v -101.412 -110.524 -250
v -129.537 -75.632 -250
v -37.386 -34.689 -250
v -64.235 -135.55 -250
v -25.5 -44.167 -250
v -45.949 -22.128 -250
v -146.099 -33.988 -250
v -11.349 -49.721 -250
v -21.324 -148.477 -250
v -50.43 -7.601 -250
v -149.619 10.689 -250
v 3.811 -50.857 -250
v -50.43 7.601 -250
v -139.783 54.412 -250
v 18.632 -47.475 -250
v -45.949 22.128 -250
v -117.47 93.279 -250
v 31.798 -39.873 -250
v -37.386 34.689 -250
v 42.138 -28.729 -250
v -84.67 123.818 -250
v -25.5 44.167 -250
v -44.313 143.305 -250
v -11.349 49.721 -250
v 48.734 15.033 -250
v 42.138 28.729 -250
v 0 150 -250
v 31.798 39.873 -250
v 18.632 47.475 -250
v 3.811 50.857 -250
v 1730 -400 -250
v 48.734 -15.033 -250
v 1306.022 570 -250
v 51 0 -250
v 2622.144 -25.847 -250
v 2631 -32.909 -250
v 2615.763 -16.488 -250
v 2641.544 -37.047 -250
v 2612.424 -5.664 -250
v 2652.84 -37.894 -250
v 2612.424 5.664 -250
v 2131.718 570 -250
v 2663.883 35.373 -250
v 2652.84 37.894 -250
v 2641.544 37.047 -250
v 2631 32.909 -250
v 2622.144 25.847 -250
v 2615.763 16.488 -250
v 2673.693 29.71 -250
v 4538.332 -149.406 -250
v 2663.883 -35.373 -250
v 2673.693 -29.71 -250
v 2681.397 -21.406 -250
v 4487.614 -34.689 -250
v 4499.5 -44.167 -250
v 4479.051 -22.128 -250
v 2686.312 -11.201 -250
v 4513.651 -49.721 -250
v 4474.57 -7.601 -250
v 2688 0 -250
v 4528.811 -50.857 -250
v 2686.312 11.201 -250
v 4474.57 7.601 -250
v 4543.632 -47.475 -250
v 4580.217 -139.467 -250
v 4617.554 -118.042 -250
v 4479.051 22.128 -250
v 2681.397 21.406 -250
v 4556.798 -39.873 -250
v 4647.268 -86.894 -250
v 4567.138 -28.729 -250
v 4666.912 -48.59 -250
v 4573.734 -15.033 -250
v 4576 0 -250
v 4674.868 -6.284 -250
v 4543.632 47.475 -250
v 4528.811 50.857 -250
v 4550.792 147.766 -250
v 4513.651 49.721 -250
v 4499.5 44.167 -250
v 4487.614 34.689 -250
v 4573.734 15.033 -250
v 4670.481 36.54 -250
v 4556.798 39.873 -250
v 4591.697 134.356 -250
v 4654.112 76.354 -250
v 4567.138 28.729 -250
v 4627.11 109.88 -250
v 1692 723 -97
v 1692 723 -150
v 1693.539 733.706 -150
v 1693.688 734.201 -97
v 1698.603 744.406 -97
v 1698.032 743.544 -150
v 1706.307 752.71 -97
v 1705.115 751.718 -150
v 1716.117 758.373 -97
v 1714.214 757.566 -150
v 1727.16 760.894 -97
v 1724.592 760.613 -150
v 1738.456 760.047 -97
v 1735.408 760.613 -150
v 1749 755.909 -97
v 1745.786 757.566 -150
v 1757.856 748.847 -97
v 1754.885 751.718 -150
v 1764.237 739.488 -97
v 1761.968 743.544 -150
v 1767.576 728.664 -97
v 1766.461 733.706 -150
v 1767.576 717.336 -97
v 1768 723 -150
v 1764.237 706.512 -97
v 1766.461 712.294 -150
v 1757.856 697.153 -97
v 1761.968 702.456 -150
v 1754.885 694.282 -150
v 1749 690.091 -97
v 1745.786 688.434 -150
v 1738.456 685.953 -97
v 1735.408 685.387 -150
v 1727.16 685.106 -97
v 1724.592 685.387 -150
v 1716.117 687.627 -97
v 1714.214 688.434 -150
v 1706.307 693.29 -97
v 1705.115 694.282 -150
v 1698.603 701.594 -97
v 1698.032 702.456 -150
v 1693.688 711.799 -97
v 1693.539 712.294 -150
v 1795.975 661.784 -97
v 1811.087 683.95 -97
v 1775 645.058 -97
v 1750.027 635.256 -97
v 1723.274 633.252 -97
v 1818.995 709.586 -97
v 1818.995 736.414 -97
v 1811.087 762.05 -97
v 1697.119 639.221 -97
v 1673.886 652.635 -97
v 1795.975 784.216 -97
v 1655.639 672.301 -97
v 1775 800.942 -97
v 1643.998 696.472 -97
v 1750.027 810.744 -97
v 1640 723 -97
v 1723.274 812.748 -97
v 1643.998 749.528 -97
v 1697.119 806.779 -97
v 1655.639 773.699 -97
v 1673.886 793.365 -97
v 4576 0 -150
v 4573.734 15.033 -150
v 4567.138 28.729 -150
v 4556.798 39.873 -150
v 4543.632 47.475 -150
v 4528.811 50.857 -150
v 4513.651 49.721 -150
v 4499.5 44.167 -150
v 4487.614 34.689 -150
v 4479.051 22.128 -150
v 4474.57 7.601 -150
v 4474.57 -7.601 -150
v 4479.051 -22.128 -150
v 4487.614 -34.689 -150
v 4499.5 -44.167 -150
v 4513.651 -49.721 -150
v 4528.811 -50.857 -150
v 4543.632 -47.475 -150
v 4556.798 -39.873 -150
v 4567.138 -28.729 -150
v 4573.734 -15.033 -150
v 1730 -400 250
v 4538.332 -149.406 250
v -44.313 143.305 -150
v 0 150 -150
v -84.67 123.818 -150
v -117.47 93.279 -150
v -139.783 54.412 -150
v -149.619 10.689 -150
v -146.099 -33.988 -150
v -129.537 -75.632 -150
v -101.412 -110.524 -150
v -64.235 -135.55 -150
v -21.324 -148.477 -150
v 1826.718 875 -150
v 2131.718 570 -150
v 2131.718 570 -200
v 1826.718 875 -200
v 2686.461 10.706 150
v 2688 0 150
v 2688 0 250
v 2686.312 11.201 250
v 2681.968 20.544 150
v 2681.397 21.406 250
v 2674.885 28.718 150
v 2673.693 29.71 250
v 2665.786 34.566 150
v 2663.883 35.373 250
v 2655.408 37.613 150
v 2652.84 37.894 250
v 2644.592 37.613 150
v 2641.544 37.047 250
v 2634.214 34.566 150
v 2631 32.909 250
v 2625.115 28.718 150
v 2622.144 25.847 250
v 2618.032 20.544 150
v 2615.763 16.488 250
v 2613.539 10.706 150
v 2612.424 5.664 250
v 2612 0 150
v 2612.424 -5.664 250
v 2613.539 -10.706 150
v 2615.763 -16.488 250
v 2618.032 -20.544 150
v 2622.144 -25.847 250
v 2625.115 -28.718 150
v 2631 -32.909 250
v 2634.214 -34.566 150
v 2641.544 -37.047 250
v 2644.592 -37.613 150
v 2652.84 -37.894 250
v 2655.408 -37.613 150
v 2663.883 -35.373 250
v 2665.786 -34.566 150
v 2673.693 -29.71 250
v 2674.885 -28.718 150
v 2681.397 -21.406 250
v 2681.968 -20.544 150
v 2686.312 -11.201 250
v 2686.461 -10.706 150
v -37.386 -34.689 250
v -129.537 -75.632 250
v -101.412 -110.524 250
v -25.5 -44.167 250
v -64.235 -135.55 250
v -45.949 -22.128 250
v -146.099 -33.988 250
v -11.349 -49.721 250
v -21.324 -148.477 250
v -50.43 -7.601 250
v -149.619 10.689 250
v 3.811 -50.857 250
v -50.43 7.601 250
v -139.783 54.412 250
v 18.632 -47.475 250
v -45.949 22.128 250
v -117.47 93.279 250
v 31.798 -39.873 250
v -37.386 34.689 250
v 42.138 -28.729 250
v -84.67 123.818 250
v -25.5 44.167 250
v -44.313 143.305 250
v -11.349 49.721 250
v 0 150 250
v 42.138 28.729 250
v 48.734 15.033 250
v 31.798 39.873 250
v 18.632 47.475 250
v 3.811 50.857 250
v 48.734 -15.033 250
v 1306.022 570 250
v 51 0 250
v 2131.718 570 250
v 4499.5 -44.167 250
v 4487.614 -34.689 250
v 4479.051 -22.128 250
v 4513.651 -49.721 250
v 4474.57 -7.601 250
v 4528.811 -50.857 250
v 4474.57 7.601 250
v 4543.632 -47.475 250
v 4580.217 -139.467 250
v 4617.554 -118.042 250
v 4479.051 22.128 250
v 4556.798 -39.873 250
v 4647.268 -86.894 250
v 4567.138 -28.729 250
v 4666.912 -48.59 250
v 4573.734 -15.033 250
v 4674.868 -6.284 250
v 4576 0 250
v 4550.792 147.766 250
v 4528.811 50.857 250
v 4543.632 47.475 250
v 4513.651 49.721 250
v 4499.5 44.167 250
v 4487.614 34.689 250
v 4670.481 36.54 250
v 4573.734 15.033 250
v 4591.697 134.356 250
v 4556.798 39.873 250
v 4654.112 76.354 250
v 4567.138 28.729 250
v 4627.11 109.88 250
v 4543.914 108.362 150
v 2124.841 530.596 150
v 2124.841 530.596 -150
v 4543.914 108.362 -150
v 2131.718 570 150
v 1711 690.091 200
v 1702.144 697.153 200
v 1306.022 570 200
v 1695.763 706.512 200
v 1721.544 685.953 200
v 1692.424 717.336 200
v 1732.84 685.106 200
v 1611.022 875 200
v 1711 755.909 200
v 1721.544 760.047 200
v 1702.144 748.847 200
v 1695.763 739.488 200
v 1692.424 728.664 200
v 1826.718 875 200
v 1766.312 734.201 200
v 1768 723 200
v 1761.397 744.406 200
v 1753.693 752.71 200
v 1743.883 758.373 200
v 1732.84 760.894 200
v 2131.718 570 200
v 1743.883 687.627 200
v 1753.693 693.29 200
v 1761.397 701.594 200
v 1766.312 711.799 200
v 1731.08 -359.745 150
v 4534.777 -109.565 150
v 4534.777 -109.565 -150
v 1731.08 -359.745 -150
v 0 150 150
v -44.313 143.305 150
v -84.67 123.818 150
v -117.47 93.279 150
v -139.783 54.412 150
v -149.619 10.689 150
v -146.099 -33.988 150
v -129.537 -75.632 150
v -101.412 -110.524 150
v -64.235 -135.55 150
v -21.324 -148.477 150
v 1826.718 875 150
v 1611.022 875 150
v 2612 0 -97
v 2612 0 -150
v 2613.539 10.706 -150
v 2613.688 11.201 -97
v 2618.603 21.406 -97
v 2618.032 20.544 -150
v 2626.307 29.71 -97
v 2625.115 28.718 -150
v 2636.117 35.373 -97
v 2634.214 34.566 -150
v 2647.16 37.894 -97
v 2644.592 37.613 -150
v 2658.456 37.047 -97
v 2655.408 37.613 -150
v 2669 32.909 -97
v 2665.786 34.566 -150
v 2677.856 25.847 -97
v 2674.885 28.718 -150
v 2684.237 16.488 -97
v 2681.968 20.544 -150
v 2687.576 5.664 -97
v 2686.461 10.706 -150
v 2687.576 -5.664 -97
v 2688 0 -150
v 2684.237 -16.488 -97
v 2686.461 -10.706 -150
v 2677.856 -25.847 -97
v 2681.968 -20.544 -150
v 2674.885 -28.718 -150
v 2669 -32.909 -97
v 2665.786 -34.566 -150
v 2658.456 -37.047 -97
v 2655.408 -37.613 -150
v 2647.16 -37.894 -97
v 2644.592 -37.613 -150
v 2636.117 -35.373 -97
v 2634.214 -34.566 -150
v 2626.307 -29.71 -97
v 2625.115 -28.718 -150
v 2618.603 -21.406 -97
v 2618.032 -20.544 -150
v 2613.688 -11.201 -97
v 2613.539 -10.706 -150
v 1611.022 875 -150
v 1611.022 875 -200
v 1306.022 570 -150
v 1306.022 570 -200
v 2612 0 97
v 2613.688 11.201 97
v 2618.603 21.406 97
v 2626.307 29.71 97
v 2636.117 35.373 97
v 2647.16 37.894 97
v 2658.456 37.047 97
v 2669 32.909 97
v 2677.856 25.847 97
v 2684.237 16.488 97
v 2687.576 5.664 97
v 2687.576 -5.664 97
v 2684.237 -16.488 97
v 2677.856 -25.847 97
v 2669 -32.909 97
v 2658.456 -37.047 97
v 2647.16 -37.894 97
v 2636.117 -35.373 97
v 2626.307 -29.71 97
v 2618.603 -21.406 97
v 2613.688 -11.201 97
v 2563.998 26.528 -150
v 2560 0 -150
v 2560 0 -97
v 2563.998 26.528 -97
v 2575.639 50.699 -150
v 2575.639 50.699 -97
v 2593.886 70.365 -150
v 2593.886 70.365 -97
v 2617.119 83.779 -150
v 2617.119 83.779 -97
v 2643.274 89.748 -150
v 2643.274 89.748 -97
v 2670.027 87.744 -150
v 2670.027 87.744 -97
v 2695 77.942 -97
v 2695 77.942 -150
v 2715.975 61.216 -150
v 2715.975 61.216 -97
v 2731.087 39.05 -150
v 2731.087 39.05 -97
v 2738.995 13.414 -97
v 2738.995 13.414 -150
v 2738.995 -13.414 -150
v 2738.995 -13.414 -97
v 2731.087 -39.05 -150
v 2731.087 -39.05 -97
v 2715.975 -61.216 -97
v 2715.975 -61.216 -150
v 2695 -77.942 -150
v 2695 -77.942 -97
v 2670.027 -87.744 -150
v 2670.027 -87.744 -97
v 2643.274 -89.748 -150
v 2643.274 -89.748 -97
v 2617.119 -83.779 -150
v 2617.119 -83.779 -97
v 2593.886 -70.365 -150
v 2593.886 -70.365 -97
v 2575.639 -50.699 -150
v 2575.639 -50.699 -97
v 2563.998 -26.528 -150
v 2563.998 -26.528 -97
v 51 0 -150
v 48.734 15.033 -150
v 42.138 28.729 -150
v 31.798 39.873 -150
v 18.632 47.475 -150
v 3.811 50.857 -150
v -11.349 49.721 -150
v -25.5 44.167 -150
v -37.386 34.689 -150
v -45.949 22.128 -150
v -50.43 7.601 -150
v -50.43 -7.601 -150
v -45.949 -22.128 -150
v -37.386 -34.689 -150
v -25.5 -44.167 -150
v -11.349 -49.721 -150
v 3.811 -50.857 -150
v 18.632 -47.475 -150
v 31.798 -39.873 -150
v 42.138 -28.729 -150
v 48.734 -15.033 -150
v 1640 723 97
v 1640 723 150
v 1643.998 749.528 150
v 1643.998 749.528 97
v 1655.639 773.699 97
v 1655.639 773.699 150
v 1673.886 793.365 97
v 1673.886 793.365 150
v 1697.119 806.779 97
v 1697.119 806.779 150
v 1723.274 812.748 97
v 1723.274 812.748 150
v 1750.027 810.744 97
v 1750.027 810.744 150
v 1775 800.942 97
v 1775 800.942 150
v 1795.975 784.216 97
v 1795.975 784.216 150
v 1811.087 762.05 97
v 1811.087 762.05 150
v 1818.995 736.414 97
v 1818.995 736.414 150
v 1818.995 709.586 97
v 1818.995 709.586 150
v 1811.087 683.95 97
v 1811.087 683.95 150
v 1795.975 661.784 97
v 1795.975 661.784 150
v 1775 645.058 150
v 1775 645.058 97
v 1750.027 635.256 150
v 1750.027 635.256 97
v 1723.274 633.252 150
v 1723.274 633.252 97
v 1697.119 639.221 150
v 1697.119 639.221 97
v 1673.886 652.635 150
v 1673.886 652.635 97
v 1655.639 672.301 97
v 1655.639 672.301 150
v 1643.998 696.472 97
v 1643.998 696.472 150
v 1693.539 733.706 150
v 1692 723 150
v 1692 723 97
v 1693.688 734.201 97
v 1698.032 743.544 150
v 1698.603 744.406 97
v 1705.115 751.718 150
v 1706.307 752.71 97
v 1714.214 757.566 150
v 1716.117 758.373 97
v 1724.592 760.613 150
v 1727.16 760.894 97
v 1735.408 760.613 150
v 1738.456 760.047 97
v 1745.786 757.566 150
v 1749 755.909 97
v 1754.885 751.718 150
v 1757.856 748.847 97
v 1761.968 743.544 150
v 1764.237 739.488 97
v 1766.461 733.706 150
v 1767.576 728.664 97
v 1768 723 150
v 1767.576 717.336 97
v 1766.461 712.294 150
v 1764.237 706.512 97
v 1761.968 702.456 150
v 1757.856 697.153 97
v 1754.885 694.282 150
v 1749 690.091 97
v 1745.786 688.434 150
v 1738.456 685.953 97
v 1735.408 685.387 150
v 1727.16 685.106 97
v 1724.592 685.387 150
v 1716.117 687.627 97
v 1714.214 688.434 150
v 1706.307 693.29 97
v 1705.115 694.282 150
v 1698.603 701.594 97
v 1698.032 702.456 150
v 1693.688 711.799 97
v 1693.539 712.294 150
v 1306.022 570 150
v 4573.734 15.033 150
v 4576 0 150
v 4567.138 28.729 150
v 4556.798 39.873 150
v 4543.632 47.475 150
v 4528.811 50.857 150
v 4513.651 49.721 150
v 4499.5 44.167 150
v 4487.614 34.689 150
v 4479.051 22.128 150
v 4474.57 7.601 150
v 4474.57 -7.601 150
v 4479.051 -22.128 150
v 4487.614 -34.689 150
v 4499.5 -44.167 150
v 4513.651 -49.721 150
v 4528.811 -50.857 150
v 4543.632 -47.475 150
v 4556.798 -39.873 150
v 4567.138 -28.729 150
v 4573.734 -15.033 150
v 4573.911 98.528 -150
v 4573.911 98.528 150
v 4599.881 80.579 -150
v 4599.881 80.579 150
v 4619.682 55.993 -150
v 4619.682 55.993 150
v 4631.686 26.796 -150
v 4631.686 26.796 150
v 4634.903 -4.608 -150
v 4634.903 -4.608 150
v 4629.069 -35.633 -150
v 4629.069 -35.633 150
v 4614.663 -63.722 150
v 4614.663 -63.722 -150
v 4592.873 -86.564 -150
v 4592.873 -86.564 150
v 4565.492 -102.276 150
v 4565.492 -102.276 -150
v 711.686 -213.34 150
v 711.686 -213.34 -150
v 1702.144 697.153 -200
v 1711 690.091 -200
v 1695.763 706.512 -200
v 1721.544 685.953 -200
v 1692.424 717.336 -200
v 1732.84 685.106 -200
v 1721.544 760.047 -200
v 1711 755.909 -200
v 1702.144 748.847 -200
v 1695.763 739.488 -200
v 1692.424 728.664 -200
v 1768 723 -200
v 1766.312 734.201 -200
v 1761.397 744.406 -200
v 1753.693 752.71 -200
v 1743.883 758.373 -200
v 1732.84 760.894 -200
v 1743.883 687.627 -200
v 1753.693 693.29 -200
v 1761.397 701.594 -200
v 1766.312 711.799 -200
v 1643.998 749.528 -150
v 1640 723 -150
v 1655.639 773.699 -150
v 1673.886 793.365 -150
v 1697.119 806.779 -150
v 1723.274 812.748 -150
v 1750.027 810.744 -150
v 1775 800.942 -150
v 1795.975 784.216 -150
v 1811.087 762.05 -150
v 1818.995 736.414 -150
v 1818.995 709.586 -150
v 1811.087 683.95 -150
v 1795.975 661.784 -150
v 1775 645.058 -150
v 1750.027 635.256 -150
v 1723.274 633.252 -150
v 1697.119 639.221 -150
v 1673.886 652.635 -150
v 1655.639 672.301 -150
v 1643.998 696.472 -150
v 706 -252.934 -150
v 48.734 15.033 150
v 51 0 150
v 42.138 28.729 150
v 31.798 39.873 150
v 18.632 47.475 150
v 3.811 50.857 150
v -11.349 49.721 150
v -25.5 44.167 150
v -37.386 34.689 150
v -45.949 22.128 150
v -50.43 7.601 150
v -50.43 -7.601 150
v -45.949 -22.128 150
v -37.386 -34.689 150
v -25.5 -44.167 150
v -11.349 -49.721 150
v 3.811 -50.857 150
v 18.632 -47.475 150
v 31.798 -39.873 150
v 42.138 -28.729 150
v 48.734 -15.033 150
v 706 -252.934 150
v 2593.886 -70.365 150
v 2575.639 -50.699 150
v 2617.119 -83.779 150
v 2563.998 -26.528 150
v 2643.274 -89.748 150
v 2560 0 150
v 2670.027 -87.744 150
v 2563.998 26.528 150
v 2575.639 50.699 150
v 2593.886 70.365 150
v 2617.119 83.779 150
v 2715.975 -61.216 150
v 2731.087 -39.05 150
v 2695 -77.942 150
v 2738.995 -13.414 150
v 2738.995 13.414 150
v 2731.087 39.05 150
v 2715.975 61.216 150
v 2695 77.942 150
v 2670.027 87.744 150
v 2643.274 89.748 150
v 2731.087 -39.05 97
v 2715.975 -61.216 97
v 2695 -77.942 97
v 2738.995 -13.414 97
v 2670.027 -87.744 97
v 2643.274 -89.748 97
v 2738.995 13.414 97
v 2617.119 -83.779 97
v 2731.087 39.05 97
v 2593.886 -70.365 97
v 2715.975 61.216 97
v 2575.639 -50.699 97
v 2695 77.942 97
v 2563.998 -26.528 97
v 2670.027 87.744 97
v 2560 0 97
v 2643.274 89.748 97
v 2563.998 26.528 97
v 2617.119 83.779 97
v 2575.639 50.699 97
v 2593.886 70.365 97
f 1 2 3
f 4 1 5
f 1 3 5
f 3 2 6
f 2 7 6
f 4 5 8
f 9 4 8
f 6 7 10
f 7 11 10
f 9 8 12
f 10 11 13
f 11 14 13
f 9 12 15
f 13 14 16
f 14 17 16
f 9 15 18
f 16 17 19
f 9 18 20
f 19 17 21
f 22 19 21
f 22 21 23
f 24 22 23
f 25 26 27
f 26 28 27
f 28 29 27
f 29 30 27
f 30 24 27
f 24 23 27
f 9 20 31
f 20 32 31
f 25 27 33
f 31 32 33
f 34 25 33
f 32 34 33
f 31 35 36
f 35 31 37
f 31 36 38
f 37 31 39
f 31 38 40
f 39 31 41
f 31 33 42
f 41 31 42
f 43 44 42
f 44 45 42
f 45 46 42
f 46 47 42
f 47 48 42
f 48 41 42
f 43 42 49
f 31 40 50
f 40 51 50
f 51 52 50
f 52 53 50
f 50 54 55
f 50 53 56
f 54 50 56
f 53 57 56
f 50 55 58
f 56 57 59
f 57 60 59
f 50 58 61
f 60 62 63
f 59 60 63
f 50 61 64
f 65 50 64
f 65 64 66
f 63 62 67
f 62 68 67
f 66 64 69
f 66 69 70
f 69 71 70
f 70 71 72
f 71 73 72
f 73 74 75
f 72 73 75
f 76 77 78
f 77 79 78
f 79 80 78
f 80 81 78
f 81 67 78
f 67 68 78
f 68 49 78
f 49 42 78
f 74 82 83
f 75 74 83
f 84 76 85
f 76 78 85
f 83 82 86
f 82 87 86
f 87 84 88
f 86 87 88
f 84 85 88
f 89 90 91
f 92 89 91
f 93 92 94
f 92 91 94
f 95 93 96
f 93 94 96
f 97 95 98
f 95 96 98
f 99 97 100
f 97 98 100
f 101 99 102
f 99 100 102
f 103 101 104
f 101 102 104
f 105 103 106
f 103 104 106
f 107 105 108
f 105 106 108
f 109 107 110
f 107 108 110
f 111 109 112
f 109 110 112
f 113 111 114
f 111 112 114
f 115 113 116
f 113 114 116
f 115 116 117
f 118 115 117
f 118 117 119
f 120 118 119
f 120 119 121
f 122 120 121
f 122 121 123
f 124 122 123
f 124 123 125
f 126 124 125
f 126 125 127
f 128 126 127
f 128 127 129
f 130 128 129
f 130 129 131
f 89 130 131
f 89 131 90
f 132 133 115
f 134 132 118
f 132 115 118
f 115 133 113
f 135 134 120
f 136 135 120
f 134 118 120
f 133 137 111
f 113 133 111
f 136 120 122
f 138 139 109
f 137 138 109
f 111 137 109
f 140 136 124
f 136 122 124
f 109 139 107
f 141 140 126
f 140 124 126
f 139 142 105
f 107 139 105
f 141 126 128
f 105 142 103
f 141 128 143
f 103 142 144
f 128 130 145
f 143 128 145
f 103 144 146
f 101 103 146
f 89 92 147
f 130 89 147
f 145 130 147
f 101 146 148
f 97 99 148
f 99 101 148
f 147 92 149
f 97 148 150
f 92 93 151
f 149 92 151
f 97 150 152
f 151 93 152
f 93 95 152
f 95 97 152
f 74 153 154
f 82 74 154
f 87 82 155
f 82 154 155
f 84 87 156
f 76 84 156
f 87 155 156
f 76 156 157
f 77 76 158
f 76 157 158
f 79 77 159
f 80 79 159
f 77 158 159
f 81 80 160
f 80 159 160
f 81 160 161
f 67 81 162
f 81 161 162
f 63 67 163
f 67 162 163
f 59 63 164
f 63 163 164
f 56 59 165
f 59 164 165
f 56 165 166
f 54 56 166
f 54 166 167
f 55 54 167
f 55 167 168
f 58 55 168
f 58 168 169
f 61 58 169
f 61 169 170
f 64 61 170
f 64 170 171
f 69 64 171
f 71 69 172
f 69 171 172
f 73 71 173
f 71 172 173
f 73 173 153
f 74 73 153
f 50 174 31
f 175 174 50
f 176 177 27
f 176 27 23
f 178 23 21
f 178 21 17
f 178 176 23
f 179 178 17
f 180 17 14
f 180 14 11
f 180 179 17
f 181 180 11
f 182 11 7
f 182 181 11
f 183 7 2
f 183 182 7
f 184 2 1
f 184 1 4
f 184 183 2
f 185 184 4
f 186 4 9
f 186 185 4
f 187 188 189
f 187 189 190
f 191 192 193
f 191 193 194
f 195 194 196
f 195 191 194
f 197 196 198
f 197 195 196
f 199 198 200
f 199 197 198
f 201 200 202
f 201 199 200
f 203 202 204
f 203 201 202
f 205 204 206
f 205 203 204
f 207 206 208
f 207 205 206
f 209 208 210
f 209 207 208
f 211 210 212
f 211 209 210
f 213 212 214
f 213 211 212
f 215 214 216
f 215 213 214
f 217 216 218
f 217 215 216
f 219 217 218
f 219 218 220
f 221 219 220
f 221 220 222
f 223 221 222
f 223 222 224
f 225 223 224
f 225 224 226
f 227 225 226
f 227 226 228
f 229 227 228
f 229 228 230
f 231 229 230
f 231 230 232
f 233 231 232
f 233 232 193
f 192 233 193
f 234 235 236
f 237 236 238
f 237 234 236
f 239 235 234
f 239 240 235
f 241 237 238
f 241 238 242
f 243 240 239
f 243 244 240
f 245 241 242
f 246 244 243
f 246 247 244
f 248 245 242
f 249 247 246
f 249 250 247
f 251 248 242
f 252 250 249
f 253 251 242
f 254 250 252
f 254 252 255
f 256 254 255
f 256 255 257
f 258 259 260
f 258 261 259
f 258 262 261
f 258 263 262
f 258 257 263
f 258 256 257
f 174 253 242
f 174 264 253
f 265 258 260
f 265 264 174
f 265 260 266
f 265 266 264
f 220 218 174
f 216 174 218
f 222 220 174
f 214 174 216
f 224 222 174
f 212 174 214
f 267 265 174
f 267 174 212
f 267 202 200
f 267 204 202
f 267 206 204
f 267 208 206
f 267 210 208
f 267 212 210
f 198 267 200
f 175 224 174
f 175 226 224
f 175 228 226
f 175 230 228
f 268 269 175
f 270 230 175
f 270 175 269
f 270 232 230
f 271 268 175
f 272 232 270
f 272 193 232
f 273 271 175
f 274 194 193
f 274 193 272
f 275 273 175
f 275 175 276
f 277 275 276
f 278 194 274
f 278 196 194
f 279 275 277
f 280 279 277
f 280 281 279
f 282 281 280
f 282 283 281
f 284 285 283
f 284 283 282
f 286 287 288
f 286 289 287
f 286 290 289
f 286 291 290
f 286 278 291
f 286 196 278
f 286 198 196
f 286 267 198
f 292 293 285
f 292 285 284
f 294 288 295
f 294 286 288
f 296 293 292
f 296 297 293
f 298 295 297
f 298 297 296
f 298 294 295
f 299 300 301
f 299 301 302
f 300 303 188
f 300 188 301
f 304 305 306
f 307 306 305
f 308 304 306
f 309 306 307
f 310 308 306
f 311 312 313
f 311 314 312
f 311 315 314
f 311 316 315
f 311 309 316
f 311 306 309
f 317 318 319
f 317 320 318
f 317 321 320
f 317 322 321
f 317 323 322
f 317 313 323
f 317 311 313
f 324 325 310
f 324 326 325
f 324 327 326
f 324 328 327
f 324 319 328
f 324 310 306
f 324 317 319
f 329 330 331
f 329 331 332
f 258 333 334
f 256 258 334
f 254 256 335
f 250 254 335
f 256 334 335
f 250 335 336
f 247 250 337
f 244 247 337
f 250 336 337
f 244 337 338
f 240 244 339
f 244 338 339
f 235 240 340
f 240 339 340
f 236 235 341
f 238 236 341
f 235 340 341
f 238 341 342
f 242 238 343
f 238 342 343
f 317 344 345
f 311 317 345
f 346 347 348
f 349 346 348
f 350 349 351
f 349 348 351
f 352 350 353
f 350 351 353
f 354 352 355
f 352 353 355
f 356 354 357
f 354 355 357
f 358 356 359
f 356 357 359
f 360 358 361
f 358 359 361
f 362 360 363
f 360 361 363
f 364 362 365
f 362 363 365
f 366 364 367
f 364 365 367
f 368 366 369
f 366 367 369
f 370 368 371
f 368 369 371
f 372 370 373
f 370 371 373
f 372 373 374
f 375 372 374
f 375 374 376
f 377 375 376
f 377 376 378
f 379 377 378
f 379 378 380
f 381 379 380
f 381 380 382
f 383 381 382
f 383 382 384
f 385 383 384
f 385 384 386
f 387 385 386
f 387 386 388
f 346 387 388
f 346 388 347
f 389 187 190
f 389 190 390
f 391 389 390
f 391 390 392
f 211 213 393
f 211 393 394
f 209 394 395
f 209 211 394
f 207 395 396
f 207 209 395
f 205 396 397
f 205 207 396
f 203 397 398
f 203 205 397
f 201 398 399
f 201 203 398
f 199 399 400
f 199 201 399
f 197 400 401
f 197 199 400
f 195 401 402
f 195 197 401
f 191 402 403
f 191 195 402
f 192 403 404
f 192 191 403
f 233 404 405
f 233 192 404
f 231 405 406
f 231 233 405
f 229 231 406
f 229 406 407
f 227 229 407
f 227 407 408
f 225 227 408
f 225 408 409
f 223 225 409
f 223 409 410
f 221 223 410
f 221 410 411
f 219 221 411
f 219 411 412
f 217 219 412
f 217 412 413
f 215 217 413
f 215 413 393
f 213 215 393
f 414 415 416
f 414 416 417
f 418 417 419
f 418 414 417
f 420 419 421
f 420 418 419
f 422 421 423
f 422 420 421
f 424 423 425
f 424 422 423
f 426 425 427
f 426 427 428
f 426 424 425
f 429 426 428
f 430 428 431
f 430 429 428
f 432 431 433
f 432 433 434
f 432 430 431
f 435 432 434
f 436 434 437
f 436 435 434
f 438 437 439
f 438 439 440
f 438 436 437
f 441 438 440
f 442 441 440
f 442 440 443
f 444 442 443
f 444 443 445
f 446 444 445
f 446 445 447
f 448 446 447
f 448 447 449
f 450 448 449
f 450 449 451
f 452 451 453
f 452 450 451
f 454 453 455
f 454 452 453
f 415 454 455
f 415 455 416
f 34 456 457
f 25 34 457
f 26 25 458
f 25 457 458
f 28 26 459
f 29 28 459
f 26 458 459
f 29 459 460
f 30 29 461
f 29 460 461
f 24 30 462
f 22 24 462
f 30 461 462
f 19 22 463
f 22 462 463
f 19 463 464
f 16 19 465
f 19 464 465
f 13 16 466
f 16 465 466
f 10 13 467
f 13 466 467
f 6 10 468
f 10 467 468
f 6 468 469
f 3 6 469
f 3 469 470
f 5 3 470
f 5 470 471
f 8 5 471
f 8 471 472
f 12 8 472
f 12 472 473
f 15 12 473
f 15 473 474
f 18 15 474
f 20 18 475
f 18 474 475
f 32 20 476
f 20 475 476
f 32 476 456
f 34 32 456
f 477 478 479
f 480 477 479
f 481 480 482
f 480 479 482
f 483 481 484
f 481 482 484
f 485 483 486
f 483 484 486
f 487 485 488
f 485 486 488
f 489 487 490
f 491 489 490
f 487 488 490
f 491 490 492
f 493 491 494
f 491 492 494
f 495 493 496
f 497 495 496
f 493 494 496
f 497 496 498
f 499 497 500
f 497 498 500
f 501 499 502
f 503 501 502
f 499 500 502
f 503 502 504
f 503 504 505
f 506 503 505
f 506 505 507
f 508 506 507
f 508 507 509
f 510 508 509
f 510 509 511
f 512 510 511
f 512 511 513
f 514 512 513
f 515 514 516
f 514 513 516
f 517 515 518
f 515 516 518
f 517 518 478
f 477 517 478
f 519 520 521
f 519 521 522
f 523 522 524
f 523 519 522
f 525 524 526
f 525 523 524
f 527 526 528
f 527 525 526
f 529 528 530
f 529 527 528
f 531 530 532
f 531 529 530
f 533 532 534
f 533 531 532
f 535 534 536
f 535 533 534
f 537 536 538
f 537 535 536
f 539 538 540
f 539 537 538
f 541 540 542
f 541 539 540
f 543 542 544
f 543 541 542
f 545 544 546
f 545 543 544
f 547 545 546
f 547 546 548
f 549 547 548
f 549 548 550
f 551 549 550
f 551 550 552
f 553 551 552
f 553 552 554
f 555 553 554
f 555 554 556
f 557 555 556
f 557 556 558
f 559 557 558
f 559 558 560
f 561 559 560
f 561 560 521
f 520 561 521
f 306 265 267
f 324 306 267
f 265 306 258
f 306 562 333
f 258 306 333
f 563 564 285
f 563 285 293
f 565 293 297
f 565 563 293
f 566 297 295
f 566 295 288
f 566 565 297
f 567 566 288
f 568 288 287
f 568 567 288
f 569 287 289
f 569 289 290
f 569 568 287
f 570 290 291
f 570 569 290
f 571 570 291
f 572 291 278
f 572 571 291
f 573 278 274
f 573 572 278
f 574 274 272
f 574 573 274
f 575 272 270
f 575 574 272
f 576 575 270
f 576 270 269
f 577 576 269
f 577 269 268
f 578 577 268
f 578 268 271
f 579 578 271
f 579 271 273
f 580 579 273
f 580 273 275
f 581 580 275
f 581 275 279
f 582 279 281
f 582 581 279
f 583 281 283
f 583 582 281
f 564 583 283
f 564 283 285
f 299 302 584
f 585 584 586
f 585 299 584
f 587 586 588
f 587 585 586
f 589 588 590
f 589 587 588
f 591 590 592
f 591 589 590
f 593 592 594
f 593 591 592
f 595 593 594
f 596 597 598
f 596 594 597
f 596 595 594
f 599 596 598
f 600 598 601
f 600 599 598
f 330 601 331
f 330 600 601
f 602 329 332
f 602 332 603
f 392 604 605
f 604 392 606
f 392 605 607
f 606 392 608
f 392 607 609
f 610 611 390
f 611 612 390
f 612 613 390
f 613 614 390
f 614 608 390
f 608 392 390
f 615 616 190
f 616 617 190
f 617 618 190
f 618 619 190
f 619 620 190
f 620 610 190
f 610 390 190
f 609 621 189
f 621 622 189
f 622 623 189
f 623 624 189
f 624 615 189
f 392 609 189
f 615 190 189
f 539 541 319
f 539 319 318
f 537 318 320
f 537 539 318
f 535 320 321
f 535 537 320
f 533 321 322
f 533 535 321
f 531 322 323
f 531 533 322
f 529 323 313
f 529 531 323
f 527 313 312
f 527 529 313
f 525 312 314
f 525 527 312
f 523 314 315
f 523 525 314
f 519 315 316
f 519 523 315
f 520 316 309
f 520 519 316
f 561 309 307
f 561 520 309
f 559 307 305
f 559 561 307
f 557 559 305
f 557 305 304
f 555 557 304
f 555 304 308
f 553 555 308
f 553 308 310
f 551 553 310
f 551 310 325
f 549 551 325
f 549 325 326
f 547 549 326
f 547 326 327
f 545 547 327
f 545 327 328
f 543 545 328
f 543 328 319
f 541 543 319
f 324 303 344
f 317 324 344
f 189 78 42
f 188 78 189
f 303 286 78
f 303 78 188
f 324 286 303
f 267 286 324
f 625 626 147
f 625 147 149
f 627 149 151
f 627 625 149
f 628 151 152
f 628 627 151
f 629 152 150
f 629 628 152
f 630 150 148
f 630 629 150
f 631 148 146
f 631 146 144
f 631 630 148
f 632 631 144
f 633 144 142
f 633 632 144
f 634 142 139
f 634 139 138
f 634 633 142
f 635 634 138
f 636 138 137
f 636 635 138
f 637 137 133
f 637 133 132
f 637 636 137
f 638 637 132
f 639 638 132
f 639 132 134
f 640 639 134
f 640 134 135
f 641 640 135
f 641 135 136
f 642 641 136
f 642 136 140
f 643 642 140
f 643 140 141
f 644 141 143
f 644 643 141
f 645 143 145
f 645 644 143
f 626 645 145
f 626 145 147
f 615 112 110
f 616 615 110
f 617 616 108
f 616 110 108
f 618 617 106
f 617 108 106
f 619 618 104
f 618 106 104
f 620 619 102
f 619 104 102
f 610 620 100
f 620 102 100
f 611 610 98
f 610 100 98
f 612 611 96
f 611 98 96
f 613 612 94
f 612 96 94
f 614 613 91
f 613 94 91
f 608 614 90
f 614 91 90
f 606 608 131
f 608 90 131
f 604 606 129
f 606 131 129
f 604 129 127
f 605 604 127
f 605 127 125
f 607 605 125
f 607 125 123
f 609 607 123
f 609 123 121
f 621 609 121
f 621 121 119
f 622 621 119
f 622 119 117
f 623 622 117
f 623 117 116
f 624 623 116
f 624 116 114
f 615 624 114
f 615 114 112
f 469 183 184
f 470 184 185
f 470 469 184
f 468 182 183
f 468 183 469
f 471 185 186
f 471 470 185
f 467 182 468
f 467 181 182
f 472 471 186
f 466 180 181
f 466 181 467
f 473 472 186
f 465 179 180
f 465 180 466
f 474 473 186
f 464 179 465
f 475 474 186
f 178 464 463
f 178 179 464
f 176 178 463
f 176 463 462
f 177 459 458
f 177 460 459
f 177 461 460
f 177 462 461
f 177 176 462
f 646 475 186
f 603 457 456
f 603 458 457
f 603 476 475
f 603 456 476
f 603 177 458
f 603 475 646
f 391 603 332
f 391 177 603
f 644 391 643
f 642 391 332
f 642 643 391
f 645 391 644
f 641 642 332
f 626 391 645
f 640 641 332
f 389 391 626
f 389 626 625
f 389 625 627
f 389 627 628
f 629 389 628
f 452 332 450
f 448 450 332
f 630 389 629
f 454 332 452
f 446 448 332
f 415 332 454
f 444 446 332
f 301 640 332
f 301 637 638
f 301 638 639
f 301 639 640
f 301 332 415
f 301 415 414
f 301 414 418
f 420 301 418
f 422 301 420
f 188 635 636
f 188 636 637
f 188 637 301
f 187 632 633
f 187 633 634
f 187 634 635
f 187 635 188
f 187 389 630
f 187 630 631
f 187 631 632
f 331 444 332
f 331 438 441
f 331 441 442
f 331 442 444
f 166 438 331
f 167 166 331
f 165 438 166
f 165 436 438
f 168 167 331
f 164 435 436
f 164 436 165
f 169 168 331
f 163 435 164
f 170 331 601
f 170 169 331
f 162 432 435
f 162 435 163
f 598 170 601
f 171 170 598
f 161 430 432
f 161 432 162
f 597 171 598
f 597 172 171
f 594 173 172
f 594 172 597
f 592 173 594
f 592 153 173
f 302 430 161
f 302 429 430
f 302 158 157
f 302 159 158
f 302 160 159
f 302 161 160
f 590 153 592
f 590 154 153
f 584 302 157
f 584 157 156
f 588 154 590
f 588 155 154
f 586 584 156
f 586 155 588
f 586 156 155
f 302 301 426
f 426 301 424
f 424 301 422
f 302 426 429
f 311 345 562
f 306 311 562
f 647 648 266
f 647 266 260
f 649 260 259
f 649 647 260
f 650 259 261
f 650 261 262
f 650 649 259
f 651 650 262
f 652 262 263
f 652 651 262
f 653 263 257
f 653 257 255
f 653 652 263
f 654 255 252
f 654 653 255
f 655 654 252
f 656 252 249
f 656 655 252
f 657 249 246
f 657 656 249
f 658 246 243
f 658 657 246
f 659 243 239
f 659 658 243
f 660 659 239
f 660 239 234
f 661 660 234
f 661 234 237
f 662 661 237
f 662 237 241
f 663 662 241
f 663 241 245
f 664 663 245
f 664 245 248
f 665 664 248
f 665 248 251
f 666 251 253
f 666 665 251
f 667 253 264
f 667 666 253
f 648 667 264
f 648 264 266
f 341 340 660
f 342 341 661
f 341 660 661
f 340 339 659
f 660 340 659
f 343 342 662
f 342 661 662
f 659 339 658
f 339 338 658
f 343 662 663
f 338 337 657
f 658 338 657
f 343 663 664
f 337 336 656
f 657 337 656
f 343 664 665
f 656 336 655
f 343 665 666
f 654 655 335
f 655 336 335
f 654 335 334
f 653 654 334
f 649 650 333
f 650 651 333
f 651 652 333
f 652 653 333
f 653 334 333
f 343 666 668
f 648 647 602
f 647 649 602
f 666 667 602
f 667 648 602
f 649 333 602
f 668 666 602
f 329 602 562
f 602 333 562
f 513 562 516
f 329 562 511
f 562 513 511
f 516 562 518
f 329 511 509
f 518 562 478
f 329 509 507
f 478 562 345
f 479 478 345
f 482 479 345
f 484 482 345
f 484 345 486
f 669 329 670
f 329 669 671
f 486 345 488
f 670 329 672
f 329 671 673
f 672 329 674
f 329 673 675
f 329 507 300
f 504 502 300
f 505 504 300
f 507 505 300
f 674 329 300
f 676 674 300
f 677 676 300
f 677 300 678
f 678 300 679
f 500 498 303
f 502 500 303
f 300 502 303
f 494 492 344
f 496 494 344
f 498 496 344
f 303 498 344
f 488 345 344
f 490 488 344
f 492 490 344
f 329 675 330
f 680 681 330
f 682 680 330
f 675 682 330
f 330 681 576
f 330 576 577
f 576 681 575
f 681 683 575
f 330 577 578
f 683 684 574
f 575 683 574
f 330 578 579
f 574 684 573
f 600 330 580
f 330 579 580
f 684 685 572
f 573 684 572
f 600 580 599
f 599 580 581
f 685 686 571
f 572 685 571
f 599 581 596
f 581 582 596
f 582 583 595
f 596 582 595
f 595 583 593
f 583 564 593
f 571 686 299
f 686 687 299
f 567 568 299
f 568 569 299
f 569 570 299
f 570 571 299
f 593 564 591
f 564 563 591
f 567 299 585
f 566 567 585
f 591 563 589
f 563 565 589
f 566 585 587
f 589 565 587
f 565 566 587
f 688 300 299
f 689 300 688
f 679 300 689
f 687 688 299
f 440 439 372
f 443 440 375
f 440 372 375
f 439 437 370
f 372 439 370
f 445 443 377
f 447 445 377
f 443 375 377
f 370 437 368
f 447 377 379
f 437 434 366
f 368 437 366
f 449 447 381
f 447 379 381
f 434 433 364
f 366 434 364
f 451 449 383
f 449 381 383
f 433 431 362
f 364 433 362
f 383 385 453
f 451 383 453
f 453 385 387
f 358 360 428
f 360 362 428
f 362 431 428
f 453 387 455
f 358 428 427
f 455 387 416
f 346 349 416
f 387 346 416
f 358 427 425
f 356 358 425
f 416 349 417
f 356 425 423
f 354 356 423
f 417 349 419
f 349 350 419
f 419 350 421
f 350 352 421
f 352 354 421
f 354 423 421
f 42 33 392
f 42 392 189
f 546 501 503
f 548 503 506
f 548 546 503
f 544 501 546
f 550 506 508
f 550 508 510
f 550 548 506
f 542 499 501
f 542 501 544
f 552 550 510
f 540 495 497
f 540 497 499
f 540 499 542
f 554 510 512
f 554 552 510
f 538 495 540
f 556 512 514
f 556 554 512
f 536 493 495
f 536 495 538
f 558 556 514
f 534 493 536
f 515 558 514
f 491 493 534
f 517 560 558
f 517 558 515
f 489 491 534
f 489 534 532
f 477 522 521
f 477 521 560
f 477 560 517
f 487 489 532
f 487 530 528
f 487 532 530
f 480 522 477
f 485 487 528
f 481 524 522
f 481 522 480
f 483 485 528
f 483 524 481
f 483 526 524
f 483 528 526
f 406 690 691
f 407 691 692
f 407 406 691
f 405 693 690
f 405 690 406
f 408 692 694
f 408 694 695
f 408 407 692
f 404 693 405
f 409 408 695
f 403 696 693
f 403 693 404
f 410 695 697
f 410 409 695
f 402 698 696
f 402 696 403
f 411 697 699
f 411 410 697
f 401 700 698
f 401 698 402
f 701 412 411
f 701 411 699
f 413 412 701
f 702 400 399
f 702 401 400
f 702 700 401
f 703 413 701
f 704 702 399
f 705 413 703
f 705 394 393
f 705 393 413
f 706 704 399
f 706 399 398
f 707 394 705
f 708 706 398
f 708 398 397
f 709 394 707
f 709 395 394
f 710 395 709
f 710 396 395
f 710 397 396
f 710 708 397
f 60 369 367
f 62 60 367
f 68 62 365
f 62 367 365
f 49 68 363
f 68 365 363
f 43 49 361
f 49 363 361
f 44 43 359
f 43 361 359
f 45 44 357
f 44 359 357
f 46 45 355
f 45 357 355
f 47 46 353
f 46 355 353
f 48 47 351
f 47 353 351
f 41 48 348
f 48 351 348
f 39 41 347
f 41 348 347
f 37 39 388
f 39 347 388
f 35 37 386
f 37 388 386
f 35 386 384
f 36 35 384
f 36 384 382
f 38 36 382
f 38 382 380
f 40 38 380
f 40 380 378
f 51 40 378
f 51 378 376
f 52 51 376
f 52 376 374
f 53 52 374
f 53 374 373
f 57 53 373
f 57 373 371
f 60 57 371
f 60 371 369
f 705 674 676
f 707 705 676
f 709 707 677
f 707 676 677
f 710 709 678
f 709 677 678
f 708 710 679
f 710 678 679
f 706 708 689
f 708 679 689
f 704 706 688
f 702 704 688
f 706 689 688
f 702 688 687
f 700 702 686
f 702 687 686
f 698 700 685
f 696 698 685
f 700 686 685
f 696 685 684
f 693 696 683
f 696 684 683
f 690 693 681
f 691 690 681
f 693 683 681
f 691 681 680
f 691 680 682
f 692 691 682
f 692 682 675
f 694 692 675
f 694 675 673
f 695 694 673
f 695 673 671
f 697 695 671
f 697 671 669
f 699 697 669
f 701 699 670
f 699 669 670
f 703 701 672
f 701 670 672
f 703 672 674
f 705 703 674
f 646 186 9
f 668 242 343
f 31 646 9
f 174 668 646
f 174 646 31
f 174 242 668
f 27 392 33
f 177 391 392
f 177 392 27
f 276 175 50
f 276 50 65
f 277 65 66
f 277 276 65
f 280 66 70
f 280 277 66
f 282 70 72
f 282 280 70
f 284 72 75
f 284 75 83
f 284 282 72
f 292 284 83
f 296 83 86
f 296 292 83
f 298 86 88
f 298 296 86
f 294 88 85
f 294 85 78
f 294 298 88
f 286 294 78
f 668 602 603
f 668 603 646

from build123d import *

# Parameters (mm, degrees)
BOSS_EXTRUDE1_START = 150
SKETCH1_R           = 51
SKETCH1_R_2         = 38
BOSS_EXTRUDE1_DEPTH = 100
BOSS_EXTRUDE2_DEPTH = 306
SKETCH4_R           = 90
SKETCH4_R_2         = 38
BOSS_EXTRUDE3_DEPTH = 53
CUT_EXTRUDE1_START  = 250
SKETCH1_3_R         = 38
CUT_EXTRUDE1_DEPTH  = 50
CUT_EXTRUDE2_START  = -250
SKETCH1_5_R         = 38
CUT_EXTRUDE2_DEPTH  = 50


with BuildPart() as part:
    # Sketch1 → Boss-Extrude1 (new body)
    with BuildSketch(Plane.XY.offset(BOSS_EXTRUDE1_START)):
        with BuildLine():
            Line((1730, -400), (4538.33185886, -149.406363785))
            ThreePointArc((4538.33185886, -149.406363785), (4674.868328403, -6.283640799), (4550.791625622, 147.766004371))
            Line((4550.791625622, 147.766004371), (2131.718421044, 570))
            Line((2131.718421044, 570), (1306.022410762, 570))
            Line((1306.022410762, 570), (0, 150))
            ThreePointArc((0, 150), (-149.618651652, 10.689203798), (-21.324056793, -148.476545629))
            Line((-21.324056793, -148.476545629), (1730, -400))
        make_face()
        with Locations((4525, 0)):
            Circle(SKETCH1_R, mode=Mode.SUBTRACT)
        with Locations((2650, 0)):
            Circle(SKETCH1_R_2, mode=Mode.SUBTRACT)
        Circle(SKETCH1_R, mode=Mode.SUBTRACT)
        Polygon((1611.022410762, 875), (1306.022410762, 570), (2131.718421044, 570), (1826.718421044, 875), align=None)
        with Locations((1730, 723)):
            Circle(SKETCH1_R_2, mode=Mode.SUBTRACT)
    boss_extrude1 = extrude(amount=BOSS_EXTRUDE1_DEPTH)

    # Sketch3 → Boss-Extrude2 (add)
    with BuildSketch(Plane(origin=(0, 0, 150), x_dir=(-1, 0, 0), z_dir=(0, 0, -1))):
        with BuildLine():
            Line((-1730, -400), (-4538.33185886, -149.406363785))
            ThreePointArc((-4538.33185886, -149.406363785), (-4674.868328403, -6.283640799), (-4550.791625622, 147.766004371))
            Line((-4550.791625622, 147.766004371), (-2131.718421044, 570))
            Line((-2131.718421044, 570), (-2124.840654212, 530.595732168))
            Line((-2124.840654212, 530.595732168), (-4543.913858789, 108.361736539))
            ThreePointArc((-4543.913858789, 108.361736539), (-4634.903440829, -4.608003253), (-4534.776696497, -109.564666775))
            Line((-4534.776696497, -109.564666775), (-1731.080049821, -359.7446928))
            Line((-1731.080049821, -359.7446928), (-711.686415145, -213.340372387))
            Line((-711.686415145, -213.340372387), (-706, -252.934117888))
            Line((-706, -252.934117888), (-1730, -400))
        make_face()
    extrude(amount=BOSS_EXTRUDE2_DEPTH)

    # Sketch4 → Boss-Extrude3 (add)
    with BuildSketch(Plane(origin=(0, 0, 150), x_dir=(-1, 0, 0), z_dir=(0, 0, -1))):
        with Locations((-2650, 0)):
            Circle(SKETCH4_R)
        with Locations((-2650, 0)):
            Circle(SKETCH4_R_2, mode=Mode.SUBTRACT)
        with Locations((-1730, 723)):
            Circle(SKETCH4_R)
        with Locations((-1730, 723)):
            Circle(SKETCH4_R_2, mode=Mode.SUBTRACT)
    boss_extrude3 = extrude(amount=BOSS_EXTRUDE3_DEPTH)

    # Sketch1<3> → Cut-Extrude1 (cut)
    with BuildSketch(Plane.XY.offset(CUT_EXTRUDE1_START)):
        Polygon((1611.022410762, 875), (1306.022410762, 570), (2131.718421044, 570), (1826.718421044, 875), align=None)
        with Locations((1730, 723)):
            Circle(SKETCH1_3_R, mode=Mode.SUBTRACT)
    extrude(amount=-CUT_EXTRUDE1_DEPTH, mode=Mode.SUBTRACT)

    # Mirror1: Boss-Extrude1, Boss-Extrude3 across plane
    add(boss_extrude1.mirror(Plane.XY))
    add(boss_extrude3.mirror(Plane.XY))

    # Sketch1<5> → Cut-Extrude2 (cut)
    with BuildSketch(Plane.XY.offset(CUT_EXTRUDE2_START)):
        Polygon((1611.022410762, 875), (1306.022410762, 570), (2131.718421044, 570), (1826.718421044, 875), align=None)
        with Locations((1730, 723)):
            Circle(SKETCH1_5_R, mode=Mode.SUBTRACT)
    extrude(amount=CUT_EXTRUDE2_DEPTH, mode=Mode.SUBTRACT)


solid = part.part
